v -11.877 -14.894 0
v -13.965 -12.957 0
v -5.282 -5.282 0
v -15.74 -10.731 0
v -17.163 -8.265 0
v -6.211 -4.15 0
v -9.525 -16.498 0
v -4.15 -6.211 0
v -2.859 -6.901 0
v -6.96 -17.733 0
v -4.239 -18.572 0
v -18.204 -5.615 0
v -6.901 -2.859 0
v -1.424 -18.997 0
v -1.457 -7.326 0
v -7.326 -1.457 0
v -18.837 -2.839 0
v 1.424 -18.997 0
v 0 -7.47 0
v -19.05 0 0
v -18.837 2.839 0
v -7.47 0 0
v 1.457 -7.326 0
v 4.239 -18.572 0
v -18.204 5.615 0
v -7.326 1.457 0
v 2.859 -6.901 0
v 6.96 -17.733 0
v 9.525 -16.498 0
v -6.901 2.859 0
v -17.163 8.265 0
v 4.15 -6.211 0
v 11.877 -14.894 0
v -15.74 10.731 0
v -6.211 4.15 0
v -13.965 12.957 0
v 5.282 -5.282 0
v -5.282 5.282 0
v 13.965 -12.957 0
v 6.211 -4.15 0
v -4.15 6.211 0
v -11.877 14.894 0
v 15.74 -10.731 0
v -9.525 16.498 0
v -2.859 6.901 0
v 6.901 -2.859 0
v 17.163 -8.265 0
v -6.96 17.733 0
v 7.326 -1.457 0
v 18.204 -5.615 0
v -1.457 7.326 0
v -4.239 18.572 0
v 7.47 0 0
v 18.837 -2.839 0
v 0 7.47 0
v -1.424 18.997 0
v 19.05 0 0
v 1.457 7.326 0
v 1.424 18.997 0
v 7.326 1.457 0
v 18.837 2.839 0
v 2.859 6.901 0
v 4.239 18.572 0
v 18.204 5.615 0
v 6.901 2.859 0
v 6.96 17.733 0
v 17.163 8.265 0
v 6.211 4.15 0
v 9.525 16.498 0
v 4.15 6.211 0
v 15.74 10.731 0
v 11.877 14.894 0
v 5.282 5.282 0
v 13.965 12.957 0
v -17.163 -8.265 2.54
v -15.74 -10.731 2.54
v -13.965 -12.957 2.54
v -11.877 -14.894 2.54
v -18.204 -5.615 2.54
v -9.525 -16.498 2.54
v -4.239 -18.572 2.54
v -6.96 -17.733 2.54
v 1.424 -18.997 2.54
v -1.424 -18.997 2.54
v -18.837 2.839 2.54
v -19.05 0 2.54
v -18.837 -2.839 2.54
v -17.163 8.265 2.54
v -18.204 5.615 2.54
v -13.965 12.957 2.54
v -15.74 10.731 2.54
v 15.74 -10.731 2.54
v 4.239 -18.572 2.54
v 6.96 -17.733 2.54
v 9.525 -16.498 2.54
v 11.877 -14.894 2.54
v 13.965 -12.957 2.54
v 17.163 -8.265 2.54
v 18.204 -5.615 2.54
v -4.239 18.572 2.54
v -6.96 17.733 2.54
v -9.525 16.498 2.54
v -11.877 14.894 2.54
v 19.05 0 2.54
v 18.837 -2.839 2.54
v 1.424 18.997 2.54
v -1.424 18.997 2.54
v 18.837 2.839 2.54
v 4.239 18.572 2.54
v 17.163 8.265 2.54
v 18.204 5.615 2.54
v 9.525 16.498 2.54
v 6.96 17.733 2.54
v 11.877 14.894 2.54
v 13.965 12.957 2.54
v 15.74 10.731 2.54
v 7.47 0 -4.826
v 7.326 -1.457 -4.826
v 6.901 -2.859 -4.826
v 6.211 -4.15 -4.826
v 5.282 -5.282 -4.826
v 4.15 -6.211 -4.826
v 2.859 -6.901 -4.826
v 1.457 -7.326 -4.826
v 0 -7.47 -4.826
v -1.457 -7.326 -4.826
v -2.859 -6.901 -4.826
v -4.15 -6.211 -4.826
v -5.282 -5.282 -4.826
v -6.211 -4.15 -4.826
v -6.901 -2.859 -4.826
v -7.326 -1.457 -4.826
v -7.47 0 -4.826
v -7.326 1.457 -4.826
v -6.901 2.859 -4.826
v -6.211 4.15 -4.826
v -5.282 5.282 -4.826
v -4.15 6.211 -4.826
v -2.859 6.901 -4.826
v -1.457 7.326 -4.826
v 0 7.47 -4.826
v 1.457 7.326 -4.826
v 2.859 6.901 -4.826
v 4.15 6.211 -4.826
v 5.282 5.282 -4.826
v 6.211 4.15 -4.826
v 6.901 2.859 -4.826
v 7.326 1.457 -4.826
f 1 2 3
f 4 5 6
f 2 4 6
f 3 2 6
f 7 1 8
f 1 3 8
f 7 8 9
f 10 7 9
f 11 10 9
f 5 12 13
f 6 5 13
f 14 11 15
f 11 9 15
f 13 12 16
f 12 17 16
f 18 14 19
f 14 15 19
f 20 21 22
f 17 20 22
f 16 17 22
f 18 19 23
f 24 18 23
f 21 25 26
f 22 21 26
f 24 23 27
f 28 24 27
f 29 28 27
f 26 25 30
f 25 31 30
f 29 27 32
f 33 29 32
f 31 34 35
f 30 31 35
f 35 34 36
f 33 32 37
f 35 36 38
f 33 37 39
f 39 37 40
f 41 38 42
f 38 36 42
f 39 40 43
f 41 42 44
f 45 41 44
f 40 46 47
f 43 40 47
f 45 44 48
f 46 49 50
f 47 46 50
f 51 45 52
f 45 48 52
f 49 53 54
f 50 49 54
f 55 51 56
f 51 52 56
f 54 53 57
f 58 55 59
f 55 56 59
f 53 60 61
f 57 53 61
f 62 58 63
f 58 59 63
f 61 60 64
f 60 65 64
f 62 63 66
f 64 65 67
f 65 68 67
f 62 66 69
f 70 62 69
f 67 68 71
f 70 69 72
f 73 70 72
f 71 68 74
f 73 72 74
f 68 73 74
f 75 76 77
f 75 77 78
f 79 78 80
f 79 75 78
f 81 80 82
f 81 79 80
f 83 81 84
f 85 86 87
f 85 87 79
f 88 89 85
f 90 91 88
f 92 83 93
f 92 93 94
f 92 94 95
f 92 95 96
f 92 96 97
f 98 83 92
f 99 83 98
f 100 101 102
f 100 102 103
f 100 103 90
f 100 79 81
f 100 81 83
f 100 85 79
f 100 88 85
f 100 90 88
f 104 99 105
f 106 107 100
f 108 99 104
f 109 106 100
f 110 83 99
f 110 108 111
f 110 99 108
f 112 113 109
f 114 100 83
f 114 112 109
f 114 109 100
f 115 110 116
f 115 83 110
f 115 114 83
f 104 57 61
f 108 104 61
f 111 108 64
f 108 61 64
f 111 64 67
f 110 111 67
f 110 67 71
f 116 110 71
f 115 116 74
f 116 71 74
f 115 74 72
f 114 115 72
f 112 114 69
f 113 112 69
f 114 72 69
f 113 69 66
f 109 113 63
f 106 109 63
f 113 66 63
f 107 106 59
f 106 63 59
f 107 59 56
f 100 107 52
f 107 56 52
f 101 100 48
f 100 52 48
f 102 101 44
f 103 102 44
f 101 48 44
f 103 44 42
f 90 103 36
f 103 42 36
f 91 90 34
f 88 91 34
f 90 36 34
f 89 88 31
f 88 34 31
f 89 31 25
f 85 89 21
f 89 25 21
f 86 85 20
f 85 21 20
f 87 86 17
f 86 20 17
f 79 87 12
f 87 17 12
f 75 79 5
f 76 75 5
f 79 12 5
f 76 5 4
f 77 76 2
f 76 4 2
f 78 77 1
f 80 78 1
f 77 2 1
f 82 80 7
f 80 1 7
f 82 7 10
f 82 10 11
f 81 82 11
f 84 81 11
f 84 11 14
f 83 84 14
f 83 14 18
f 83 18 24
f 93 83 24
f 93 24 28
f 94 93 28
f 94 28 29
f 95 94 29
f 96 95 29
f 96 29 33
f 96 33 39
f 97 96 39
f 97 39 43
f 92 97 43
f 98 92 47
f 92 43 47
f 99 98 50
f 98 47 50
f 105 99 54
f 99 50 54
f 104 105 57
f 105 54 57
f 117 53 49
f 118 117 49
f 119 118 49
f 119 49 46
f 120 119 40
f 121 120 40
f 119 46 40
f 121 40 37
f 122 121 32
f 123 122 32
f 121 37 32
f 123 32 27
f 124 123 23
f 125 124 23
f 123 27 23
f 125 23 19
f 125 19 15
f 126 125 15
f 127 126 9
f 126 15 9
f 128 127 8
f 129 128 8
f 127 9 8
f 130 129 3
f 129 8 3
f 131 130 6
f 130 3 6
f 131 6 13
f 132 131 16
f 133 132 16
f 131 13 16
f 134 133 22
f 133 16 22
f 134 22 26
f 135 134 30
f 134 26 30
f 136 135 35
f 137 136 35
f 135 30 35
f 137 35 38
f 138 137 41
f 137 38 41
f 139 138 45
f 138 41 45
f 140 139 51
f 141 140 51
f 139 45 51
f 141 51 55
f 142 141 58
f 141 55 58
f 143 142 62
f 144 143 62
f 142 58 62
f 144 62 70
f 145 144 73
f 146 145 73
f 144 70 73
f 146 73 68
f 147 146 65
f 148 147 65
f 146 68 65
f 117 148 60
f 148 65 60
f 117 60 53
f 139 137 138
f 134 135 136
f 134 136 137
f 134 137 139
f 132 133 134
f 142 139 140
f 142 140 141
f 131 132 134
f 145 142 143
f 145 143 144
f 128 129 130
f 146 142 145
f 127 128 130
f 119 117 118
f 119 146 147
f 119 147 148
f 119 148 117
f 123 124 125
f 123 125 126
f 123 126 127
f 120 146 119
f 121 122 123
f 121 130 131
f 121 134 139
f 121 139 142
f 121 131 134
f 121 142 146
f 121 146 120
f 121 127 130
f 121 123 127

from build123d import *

# Parameters (mm, degrees)
F0_R     = 2.25
F1_DEPTH = 2.54
F0_R_2   = 19.05
F2_DEPTH = 2.54
F3_R     = 7.47
F4_DEPTH = 4.826


with BuildPart() as f1:
    # F0 (on Top) → F1 (new body)
    with BuildSketch(Plane.XY):
        Circle(F0_R)
    extrude(amount=F1_DEPTH)

    # F0 (on Top) → F2 (join)
    with BuildSketch(Plane.XY):
        Circle(F0_R_2)
        Circle(F0_R, mode=Mode.SUBTRACT)
    extrude(amount=F2_DEPTH)

    # F3 (on face) → F4 (join)
    with BuildSketch(Plane(origin=(0, 0, 0), x_dir=(1, 0, 0), z_dir=(0, 0, -1))):
        Circle(F3_R)
    extrude(amount=F4_DEPTH)


solid = f1.part
